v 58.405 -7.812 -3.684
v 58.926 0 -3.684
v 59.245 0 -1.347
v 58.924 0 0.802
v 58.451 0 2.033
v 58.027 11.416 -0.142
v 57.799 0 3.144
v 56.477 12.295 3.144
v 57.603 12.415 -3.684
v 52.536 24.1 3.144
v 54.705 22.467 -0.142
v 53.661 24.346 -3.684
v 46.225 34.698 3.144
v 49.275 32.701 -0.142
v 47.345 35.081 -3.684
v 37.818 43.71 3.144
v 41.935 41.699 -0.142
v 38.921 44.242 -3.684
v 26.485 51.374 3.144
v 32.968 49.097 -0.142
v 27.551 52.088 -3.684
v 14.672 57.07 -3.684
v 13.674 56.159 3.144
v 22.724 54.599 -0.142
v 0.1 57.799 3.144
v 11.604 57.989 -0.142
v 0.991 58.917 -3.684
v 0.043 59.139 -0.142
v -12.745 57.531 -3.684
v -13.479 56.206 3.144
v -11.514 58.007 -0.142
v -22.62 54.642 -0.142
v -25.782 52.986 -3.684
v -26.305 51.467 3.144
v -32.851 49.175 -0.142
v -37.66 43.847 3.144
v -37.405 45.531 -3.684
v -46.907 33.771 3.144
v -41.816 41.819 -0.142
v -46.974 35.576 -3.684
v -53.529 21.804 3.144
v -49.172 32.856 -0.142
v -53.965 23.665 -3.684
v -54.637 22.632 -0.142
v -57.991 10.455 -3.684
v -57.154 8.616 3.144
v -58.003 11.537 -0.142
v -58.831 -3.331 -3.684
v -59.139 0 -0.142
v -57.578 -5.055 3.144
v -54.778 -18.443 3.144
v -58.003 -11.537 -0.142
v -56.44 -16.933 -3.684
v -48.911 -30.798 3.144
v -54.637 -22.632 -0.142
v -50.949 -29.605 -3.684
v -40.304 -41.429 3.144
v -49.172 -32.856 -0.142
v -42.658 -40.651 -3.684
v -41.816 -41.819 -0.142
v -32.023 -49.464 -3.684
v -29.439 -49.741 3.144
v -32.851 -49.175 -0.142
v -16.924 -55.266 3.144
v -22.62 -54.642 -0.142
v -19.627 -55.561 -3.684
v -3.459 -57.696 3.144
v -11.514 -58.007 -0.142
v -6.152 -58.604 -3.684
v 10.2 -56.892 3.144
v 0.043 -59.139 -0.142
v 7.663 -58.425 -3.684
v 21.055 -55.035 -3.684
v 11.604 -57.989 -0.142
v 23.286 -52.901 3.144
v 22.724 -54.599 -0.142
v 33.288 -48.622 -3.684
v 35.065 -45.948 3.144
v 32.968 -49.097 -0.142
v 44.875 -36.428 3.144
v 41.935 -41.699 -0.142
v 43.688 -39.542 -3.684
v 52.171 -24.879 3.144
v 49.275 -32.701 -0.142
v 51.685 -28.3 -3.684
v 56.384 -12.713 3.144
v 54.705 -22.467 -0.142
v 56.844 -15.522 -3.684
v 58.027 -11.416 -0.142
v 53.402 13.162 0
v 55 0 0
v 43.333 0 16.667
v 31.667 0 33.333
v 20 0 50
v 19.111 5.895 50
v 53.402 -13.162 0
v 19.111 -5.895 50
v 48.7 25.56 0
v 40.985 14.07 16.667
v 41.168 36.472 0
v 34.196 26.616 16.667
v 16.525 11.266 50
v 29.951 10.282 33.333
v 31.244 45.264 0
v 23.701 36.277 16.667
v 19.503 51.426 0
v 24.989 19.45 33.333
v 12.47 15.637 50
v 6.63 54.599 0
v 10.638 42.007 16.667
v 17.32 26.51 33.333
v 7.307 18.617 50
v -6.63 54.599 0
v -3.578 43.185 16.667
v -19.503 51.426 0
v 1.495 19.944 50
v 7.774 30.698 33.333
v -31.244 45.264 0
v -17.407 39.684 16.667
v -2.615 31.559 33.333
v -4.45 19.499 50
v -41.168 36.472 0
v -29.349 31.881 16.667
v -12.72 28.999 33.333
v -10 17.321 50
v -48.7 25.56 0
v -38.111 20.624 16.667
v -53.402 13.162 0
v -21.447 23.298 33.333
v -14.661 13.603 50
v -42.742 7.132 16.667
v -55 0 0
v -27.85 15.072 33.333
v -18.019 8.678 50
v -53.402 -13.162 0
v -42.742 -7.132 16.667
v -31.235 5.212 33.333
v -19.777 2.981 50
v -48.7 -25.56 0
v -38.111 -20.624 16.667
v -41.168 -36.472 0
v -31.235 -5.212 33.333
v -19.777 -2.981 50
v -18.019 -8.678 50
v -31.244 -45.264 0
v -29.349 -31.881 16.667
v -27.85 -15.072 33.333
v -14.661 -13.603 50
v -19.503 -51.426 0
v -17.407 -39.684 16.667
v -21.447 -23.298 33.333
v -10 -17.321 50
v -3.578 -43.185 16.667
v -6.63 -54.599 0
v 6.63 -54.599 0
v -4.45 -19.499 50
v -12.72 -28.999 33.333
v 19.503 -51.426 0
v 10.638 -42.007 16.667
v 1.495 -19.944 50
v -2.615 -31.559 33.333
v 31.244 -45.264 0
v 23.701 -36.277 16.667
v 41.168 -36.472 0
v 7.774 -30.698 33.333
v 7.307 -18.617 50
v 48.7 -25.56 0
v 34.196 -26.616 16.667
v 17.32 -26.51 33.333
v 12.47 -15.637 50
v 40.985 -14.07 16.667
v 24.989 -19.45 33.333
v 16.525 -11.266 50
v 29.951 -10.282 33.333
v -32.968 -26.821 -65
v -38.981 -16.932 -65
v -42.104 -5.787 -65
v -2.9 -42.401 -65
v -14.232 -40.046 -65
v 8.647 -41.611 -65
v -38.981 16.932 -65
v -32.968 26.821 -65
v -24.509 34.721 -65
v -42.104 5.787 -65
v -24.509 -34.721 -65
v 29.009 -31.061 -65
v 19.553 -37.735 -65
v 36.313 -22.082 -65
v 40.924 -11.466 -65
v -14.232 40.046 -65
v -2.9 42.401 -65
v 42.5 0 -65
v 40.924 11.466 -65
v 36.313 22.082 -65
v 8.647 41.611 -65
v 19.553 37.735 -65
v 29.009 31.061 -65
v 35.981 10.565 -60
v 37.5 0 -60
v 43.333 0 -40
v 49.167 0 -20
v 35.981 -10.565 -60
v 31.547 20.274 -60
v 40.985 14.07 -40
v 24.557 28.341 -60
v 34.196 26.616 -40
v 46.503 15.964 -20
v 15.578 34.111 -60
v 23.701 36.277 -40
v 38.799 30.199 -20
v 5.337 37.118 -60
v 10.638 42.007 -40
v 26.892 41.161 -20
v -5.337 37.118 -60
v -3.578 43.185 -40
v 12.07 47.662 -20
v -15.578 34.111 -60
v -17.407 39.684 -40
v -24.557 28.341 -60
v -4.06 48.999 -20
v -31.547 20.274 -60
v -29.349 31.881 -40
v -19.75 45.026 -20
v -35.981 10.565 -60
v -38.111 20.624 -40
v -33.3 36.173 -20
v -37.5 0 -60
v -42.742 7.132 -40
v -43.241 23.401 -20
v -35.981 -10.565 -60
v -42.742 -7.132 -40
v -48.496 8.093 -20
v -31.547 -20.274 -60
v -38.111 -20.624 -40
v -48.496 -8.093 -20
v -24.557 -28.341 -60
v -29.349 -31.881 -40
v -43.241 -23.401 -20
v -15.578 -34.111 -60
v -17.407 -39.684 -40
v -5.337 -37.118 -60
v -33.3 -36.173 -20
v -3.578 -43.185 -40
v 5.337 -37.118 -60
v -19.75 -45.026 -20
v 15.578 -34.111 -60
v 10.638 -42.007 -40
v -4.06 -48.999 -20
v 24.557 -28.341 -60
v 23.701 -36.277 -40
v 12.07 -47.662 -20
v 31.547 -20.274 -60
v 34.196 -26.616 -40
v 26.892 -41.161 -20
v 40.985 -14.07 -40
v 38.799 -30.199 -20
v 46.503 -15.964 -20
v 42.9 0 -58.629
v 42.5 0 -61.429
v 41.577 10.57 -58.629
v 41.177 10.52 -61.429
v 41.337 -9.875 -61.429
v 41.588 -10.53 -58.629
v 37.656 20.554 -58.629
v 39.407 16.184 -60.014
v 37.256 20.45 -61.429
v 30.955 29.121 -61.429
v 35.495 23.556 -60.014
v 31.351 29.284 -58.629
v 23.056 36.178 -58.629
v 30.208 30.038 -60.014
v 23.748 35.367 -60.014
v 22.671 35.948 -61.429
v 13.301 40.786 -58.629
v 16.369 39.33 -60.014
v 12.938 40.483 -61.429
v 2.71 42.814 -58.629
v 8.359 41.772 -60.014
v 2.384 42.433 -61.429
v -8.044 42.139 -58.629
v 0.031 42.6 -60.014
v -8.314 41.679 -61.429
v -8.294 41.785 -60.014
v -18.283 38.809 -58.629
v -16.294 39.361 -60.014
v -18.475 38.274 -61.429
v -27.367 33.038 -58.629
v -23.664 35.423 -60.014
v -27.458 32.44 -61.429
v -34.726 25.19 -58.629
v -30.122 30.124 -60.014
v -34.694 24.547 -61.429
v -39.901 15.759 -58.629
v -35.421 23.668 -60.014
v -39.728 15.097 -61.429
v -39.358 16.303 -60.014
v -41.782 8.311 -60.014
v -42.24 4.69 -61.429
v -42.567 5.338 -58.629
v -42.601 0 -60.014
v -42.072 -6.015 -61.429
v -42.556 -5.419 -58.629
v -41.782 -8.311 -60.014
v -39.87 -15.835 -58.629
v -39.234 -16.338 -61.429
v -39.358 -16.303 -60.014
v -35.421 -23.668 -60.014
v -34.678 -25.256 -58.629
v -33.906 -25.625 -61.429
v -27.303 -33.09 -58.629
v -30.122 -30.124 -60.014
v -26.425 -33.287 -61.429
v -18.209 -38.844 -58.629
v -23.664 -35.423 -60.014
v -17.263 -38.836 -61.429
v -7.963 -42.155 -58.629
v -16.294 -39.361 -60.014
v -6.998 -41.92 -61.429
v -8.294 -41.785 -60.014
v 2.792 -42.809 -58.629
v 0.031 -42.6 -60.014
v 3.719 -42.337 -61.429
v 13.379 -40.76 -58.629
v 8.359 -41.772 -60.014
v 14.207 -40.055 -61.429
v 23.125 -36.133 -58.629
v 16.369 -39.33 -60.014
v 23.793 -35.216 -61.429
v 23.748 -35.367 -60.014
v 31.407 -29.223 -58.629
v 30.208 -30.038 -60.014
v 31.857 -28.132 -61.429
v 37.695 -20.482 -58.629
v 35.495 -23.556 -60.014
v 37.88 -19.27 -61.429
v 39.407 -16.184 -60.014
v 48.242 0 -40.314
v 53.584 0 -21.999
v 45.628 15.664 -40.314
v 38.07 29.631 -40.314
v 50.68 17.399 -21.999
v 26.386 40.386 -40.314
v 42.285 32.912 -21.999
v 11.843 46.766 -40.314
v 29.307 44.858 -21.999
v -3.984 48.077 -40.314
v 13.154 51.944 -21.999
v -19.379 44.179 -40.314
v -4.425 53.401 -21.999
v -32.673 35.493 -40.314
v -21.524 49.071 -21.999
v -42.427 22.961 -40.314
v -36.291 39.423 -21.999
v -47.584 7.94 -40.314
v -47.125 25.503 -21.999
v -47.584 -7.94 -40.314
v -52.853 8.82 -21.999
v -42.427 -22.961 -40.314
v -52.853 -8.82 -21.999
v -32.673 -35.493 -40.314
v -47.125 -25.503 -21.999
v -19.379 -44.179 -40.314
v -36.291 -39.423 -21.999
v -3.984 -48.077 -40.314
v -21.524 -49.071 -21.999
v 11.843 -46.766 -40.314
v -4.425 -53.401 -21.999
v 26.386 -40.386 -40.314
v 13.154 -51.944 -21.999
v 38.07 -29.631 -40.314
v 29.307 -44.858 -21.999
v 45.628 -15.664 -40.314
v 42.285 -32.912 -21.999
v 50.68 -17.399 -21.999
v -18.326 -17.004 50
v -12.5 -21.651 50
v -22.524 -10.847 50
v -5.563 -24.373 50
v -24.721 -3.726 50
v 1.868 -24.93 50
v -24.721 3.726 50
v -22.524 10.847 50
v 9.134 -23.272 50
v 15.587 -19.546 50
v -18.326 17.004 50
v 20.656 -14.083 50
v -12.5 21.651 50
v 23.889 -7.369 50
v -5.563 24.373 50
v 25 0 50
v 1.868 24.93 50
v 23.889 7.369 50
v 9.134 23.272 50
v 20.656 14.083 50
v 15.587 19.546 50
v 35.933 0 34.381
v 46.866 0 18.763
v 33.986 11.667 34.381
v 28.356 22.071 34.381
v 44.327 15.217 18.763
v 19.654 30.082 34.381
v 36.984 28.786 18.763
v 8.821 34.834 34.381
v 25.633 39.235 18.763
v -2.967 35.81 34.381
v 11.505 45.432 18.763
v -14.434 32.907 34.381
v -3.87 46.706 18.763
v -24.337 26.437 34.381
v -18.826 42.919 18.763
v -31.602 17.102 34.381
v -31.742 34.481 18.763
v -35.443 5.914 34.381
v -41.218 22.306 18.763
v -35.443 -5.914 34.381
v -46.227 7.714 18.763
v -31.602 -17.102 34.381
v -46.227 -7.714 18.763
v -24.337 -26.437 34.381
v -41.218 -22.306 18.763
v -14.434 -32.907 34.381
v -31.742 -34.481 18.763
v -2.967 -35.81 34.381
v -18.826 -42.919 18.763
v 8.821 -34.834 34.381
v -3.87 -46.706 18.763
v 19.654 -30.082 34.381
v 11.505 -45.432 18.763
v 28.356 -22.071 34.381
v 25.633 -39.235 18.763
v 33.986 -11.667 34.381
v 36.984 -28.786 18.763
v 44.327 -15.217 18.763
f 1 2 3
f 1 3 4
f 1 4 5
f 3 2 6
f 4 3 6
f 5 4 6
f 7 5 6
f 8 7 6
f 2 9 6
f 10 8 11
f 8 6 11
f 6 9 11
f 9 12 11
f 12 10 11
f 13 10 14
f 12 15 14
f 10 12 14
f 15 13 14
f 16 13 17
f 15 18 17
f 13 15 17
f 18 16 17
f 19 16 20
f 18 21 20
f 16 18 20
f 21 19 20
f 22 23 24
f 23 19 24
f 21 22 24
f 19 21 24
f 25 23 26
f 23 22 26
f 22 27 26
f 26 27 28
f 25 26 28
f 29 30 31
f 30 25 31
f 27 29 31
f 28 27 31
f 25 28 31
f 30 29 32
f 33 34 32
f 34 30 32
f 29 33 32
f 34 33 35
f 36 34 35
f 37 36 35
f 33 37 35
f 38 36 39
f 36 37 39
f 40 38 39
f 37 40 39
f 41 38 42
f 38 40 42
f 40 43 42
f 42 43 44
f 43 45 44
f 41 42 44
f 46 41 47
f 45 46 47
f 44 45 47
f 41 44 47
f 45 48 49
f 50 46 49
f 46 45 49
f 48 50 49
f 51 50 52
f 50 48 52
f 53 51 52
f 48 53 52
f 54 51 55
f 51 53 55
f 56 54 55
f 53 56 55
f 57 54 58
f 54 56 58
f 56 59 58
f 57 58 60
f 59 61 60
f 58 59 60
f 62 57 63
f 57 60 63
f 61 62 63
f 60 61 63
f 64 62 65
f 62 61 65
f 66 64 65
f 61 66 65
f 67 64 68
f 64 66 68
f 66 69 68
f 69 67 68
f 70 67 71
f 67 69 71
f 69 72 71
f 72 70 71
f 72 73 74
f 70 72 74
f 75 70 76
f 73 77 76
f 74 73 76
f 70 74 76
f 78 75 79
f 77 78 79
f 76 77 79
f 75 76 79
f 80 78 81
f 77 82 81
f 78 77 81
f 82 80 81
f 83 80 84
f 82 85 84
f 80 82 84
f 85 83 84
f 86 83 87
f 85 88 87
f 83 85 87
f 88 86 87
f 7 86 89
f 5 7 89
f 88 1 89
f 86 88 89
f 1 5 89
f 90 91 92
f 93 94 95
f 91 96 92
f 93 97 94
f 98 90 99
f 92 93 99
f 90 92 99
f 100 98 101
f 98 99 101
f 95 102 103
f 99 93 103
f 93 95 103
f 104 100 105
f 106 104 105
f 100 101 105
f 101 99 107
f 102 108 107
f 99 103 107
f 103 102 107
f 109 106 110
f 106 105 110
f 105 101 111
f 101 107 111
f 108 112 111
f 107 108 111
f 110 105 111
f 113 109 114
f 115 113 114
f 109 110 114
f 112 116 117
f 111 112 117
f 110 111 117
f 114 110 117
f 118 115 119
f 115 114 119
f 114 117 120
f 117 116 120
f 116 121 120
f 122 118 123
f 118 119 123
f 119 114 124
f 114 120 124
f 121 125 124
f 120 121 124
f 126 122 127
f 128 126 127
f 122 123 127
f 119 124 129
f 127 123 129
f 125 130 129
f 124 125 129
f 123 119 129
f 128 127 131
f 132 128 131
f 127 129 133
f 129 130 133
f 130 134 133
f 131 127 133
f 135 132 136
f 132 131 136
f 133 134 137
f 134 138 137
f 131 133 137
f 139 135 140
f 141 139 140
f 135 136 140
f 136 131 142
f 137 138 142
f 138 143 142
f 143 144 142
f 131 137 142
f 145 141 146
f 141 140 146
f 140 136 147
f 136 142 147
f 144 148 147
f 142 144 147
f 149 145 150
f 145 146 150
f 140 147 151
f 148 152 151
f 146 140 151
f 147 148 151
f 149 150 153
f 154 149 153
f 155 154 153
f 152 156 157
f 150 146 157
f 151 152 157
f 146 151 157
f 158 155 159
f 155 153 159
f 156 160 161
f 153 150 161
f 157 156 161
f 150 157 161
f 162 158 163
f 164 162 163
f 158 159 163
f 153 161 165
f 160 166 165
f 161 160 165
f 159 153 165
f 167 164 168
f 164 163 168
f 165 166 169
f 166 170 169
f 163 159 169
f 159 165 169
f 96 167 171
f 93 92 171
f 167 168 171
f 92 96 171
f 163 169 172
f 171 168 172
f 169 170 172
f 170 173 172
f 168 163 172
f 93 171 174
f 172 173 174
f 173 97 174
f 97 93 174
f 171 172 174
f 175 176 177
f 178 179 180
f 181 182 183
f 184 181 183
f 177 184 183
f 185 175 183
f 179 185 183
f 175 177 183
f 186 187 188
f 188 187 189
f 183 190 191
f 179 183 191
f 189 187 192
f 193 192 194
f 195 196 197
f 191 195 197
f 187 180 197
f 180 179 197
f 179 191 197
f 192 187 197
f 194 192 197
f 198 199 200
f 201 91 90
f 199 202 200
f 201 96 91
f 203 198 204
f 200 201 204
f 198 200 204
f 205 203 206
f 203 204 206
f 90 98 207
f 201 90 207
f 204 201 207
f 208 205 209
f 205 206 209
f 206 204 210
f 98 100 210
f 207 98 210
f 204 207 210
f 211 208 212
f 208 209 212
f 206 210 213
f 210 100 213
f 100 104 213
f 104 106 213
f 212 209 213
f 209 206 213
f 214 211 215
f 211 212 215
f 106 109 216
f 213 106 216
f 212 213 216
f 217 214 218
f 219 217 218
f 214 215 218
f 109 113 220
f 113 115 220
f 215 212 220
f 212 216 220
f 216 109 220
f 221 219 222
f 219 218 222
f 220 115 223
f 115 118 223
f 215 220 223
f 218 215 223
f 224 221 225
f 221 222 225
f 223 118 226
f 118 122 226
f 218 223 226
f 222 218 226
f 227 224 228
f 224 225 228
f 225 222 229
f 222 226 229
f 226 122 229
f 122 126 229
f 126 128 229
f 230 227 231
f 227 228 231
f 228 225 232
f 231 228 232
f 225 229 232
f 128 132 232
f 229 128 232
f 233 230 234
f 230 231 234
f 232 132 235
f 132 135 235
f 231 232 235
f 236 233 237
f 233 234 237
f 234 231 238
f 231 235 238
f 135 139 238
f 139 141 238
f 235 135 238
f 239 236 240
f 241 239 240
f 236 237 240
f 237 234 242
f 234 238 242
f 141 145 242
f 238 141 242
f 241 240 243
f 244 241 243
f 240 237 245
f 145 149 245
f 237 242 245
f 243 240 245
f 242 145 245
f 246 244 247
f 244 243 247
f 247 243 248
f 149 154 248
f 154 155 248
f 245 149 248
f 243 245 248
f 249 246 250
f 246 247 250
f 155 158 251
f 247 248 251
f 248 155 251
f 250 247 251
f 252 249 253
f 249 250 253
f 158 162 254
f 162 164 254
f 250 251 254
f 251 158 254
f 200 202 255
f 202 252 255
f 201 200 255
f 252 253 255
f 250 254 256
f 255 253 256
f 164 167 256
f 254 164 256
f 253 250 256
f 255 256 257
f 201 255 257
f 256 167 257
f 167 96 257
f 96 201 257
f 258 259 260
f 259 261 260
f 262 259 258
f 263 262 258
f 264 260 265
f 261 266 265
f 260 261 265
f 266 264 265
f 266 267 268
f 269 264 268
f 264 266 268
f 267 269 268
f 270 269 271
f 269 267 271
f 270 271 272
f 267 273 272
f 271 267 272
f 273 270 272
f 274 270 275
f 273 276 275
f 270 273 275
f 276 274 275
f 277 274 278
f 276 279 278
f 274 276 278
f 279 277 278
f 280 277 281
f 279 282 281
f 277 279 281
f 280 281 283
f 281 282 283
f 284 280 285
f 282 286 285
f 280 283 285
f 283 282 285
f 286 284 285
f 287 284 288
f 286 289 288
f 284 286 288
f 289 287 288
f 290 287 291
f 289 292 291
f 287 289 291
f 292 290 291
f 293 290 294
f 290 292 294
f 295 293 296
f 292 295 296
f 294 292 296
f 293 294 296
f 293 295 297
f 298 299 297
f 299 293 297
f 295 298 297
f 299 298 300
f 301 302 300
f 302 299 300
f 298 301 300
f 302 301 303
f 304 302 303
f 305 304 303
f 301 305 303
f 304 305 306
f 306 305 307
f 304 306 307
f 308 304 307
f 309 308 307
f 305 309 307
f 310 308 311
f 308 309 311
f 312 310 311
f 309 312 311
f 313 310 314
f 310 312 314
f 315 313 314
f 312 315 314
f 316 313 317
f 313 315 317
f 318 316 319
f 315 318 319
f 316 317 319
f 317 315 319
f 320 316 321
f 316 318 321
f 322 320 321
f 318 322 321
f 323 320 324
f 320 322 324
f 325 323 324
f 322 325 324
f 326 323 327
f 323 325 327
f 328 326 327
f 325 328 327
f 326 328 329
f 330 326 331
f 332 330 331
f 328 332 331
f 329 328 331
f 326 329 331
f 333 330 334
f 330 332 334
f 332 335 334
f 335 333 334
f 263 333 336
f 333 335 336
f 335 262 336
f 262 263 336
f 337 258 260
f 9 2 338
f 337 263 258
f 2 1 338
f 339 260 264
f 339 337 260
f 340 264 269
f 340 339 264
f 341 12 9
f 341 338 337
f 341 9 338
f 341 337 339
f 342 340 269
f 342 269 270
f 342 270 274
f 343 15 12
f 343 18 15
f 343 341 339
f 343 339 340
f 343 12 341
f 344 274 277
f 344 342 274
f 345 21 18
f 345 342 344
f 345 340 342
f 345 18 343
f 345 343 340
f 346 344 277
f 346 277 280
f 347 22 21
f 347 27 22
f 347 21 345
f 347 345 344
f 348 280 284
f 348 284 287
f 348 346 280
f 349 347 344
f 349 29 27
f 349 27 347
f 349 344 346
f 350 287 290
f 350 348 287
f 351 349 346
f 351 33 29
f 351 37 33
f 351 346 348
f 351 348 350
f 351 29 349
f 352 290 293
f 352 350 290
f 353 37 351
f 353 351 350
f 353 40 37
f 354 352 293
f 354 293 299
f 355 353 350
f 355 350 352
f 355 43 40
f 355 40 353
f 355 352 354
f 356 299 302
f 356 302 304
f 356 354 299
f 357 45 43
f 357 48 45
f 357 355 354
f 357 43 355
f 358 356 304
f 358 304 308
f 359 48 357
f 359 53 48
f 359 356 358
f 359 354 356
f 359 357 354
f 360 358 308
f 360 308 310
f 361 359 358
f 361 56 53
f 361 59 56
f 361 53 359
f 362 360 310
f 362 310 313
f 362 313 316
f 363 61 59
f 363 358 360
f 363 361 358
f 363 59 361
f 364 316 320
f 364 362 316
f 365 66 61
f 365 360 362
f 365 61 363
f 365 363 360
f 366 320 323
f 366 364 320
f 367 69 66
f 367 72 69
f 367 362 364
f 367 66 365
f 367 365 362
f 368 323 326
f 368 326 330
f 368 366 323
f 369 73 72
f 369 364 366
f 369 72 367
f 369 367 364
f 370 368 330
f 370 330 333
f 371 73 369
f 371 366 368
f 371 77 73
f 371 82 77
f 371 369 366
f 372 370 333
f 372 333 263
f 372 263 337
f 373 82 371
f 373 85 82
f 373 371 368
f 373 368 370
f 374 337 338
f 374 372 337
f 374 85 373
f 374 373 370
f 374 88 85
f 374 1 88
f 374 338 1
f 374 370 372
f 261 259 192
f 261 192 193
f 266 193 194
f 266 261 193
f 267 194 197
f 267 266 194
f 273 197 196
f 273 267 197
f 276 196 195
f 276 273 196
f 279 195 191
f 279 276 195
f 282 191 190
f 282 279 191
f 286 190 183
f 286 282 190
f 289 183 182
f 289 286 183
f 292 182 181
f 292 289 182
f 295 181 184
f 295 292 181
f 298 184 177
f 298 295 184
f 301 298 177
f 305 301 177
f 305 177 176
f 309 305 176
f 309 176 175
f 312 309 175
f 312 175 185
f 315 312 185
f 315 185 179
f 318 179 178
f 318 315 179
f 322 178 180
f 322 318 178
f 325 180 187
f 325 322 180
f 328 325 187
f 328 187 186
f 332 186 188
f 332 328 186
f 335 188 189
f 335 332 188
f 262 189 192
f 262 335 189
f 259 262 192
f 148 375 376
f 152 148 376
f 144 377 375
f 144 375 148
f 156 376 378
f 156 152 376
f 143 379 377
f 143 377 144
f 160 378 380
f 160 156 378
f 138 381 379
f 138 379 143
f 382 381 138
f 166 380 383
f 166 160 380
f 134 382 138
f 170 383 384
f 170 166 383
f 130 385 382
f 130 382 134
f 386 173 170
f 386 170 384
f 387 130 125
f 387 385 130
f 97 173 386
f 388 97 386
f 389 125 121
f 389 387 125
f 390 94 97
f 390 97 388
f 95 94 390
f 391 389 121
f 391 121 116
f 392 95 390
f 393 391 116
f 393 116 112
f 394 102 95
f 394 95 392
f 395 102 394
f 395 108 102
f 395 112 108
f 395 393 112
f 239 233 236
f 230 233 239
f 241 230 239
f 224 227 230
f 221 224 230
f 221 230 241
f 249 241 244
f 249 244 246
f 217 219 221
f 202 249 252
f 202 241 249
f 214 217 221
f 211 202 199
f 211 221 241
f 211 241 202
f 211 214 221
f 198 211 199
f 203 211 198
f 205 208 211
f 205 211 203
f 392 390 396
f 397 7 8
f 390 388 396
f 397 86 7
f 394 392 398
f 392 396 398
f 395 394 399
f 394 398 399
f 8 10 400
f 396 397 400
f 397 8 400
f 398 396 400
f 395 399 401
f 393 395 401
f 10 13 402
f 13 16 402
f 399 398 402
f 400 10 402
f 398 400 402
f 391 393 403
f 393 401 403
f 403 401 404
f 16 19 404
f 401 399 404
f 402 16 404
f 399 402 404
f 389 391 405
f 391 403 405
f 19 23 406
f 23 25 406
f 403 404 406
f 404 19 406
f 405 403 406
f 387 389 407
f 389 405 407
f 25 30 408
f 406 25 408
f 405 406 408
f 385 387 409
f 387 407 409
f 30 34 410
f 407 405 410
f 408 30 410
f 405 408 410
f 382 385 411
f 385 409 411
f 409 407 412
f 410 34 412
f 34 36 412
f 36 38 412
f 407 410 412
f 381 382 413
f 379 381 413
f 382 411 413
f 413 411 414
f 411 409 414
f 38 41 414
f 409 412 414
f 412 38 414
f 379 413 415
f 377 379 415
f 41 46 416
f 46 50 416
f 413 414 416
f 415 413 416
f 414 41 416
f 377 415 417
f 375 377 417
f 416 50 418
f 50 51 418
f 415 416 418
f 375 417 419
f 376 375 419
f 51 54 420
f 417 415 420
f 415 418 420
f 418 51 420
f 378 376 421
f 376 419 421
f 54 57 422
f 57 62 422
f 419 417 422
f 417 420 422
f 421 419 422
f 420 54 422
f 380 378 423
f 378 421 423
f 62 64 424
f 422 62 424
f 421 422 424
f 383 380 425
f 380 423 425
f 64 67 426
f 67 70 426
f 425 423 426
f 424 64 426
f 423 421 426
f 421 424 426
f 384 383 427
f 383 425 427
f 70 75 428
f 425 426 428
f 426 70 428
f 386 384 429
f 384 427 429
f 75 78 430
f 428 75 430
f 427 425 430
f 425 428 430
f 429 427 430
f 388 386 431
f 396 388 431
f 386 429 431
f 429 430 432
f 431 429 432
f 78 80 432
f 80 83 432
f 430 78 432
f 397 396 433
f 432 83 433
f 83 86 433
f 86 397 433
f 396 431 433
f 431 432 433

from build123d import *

# Parameters (mm, degrees)
F2_R      = 25
F1_R      = 60
F5_R      = 42.5
F3_FACE_R = 60
F9_R      = 55
F7_R      = 20
F8_R      = 37.5
F12_R     = 8
F13_R     = 42.5
F14_DEPTH = 5
F15_R     = 10


with BuildPart() as f3:
    # F2 (on offset) → F3 section 0
    with BuildSketch(Plane.XY.offset(50)):
        Circle(F2_R)
    # F1 (on Top) → F3 section 1
    with BuildSketch(Plane.XY):
        Circle(F1_R)
    loft()

    # F5 (on offset) → F6 section 0
    with BuildSketch(Plane.XY.offset(-60)):
        Circle(F5_R)
    # F3_face (on face) → F6 section 1
    with BuildSketch(Plane(origin=(0, 0, 0), x_dir=(1, 0, 0), z_dir=(0, 0, -1))):
        Circle(F3_FACE_R)
    loft()

    # F9 (on Top) → F10 section 0
    with BuildSketch(Plane.XY):
        Circle(F9_R)
    # F7 (on offset) → F10 section 1
    with BuildSketch(Plane.XY.offset(50)):
        Circle(F7_R)
    loft(mode=Mode.SUBTRACT)

    # F8 (on offset) → F11 section 0
    with BuildSketch(Plane.XY.offset(-60)):
        Circle(F8_R)
    # F9 (on Top) → F11 section 1
    with BuildSketch(Plane.XY):
        Circle(F9_R)
    loft(mode=Mode.SUBTRACT)

    # F12
    f12_edges = [f3.edges().sort_by_distance(p)[0] for p in [
        (-60, 0, 0),
    ]]
    fillet(f12_edges, radius=F12_R)

    # F13 (on offset) → F14 (join)
    with BuildSketch(Plane.XY.offset(-60)):
        Circle(F13_R)
    extrude(amount=-F14_DEPTH)

    # F15
    f15_edges = [f3.edges().sort_by_distance(p)[0] for p in [
        (-42.5, 0, -60),
    ]]
    fillet(f15_edges, radius=F15_R)


solid = f3.part
